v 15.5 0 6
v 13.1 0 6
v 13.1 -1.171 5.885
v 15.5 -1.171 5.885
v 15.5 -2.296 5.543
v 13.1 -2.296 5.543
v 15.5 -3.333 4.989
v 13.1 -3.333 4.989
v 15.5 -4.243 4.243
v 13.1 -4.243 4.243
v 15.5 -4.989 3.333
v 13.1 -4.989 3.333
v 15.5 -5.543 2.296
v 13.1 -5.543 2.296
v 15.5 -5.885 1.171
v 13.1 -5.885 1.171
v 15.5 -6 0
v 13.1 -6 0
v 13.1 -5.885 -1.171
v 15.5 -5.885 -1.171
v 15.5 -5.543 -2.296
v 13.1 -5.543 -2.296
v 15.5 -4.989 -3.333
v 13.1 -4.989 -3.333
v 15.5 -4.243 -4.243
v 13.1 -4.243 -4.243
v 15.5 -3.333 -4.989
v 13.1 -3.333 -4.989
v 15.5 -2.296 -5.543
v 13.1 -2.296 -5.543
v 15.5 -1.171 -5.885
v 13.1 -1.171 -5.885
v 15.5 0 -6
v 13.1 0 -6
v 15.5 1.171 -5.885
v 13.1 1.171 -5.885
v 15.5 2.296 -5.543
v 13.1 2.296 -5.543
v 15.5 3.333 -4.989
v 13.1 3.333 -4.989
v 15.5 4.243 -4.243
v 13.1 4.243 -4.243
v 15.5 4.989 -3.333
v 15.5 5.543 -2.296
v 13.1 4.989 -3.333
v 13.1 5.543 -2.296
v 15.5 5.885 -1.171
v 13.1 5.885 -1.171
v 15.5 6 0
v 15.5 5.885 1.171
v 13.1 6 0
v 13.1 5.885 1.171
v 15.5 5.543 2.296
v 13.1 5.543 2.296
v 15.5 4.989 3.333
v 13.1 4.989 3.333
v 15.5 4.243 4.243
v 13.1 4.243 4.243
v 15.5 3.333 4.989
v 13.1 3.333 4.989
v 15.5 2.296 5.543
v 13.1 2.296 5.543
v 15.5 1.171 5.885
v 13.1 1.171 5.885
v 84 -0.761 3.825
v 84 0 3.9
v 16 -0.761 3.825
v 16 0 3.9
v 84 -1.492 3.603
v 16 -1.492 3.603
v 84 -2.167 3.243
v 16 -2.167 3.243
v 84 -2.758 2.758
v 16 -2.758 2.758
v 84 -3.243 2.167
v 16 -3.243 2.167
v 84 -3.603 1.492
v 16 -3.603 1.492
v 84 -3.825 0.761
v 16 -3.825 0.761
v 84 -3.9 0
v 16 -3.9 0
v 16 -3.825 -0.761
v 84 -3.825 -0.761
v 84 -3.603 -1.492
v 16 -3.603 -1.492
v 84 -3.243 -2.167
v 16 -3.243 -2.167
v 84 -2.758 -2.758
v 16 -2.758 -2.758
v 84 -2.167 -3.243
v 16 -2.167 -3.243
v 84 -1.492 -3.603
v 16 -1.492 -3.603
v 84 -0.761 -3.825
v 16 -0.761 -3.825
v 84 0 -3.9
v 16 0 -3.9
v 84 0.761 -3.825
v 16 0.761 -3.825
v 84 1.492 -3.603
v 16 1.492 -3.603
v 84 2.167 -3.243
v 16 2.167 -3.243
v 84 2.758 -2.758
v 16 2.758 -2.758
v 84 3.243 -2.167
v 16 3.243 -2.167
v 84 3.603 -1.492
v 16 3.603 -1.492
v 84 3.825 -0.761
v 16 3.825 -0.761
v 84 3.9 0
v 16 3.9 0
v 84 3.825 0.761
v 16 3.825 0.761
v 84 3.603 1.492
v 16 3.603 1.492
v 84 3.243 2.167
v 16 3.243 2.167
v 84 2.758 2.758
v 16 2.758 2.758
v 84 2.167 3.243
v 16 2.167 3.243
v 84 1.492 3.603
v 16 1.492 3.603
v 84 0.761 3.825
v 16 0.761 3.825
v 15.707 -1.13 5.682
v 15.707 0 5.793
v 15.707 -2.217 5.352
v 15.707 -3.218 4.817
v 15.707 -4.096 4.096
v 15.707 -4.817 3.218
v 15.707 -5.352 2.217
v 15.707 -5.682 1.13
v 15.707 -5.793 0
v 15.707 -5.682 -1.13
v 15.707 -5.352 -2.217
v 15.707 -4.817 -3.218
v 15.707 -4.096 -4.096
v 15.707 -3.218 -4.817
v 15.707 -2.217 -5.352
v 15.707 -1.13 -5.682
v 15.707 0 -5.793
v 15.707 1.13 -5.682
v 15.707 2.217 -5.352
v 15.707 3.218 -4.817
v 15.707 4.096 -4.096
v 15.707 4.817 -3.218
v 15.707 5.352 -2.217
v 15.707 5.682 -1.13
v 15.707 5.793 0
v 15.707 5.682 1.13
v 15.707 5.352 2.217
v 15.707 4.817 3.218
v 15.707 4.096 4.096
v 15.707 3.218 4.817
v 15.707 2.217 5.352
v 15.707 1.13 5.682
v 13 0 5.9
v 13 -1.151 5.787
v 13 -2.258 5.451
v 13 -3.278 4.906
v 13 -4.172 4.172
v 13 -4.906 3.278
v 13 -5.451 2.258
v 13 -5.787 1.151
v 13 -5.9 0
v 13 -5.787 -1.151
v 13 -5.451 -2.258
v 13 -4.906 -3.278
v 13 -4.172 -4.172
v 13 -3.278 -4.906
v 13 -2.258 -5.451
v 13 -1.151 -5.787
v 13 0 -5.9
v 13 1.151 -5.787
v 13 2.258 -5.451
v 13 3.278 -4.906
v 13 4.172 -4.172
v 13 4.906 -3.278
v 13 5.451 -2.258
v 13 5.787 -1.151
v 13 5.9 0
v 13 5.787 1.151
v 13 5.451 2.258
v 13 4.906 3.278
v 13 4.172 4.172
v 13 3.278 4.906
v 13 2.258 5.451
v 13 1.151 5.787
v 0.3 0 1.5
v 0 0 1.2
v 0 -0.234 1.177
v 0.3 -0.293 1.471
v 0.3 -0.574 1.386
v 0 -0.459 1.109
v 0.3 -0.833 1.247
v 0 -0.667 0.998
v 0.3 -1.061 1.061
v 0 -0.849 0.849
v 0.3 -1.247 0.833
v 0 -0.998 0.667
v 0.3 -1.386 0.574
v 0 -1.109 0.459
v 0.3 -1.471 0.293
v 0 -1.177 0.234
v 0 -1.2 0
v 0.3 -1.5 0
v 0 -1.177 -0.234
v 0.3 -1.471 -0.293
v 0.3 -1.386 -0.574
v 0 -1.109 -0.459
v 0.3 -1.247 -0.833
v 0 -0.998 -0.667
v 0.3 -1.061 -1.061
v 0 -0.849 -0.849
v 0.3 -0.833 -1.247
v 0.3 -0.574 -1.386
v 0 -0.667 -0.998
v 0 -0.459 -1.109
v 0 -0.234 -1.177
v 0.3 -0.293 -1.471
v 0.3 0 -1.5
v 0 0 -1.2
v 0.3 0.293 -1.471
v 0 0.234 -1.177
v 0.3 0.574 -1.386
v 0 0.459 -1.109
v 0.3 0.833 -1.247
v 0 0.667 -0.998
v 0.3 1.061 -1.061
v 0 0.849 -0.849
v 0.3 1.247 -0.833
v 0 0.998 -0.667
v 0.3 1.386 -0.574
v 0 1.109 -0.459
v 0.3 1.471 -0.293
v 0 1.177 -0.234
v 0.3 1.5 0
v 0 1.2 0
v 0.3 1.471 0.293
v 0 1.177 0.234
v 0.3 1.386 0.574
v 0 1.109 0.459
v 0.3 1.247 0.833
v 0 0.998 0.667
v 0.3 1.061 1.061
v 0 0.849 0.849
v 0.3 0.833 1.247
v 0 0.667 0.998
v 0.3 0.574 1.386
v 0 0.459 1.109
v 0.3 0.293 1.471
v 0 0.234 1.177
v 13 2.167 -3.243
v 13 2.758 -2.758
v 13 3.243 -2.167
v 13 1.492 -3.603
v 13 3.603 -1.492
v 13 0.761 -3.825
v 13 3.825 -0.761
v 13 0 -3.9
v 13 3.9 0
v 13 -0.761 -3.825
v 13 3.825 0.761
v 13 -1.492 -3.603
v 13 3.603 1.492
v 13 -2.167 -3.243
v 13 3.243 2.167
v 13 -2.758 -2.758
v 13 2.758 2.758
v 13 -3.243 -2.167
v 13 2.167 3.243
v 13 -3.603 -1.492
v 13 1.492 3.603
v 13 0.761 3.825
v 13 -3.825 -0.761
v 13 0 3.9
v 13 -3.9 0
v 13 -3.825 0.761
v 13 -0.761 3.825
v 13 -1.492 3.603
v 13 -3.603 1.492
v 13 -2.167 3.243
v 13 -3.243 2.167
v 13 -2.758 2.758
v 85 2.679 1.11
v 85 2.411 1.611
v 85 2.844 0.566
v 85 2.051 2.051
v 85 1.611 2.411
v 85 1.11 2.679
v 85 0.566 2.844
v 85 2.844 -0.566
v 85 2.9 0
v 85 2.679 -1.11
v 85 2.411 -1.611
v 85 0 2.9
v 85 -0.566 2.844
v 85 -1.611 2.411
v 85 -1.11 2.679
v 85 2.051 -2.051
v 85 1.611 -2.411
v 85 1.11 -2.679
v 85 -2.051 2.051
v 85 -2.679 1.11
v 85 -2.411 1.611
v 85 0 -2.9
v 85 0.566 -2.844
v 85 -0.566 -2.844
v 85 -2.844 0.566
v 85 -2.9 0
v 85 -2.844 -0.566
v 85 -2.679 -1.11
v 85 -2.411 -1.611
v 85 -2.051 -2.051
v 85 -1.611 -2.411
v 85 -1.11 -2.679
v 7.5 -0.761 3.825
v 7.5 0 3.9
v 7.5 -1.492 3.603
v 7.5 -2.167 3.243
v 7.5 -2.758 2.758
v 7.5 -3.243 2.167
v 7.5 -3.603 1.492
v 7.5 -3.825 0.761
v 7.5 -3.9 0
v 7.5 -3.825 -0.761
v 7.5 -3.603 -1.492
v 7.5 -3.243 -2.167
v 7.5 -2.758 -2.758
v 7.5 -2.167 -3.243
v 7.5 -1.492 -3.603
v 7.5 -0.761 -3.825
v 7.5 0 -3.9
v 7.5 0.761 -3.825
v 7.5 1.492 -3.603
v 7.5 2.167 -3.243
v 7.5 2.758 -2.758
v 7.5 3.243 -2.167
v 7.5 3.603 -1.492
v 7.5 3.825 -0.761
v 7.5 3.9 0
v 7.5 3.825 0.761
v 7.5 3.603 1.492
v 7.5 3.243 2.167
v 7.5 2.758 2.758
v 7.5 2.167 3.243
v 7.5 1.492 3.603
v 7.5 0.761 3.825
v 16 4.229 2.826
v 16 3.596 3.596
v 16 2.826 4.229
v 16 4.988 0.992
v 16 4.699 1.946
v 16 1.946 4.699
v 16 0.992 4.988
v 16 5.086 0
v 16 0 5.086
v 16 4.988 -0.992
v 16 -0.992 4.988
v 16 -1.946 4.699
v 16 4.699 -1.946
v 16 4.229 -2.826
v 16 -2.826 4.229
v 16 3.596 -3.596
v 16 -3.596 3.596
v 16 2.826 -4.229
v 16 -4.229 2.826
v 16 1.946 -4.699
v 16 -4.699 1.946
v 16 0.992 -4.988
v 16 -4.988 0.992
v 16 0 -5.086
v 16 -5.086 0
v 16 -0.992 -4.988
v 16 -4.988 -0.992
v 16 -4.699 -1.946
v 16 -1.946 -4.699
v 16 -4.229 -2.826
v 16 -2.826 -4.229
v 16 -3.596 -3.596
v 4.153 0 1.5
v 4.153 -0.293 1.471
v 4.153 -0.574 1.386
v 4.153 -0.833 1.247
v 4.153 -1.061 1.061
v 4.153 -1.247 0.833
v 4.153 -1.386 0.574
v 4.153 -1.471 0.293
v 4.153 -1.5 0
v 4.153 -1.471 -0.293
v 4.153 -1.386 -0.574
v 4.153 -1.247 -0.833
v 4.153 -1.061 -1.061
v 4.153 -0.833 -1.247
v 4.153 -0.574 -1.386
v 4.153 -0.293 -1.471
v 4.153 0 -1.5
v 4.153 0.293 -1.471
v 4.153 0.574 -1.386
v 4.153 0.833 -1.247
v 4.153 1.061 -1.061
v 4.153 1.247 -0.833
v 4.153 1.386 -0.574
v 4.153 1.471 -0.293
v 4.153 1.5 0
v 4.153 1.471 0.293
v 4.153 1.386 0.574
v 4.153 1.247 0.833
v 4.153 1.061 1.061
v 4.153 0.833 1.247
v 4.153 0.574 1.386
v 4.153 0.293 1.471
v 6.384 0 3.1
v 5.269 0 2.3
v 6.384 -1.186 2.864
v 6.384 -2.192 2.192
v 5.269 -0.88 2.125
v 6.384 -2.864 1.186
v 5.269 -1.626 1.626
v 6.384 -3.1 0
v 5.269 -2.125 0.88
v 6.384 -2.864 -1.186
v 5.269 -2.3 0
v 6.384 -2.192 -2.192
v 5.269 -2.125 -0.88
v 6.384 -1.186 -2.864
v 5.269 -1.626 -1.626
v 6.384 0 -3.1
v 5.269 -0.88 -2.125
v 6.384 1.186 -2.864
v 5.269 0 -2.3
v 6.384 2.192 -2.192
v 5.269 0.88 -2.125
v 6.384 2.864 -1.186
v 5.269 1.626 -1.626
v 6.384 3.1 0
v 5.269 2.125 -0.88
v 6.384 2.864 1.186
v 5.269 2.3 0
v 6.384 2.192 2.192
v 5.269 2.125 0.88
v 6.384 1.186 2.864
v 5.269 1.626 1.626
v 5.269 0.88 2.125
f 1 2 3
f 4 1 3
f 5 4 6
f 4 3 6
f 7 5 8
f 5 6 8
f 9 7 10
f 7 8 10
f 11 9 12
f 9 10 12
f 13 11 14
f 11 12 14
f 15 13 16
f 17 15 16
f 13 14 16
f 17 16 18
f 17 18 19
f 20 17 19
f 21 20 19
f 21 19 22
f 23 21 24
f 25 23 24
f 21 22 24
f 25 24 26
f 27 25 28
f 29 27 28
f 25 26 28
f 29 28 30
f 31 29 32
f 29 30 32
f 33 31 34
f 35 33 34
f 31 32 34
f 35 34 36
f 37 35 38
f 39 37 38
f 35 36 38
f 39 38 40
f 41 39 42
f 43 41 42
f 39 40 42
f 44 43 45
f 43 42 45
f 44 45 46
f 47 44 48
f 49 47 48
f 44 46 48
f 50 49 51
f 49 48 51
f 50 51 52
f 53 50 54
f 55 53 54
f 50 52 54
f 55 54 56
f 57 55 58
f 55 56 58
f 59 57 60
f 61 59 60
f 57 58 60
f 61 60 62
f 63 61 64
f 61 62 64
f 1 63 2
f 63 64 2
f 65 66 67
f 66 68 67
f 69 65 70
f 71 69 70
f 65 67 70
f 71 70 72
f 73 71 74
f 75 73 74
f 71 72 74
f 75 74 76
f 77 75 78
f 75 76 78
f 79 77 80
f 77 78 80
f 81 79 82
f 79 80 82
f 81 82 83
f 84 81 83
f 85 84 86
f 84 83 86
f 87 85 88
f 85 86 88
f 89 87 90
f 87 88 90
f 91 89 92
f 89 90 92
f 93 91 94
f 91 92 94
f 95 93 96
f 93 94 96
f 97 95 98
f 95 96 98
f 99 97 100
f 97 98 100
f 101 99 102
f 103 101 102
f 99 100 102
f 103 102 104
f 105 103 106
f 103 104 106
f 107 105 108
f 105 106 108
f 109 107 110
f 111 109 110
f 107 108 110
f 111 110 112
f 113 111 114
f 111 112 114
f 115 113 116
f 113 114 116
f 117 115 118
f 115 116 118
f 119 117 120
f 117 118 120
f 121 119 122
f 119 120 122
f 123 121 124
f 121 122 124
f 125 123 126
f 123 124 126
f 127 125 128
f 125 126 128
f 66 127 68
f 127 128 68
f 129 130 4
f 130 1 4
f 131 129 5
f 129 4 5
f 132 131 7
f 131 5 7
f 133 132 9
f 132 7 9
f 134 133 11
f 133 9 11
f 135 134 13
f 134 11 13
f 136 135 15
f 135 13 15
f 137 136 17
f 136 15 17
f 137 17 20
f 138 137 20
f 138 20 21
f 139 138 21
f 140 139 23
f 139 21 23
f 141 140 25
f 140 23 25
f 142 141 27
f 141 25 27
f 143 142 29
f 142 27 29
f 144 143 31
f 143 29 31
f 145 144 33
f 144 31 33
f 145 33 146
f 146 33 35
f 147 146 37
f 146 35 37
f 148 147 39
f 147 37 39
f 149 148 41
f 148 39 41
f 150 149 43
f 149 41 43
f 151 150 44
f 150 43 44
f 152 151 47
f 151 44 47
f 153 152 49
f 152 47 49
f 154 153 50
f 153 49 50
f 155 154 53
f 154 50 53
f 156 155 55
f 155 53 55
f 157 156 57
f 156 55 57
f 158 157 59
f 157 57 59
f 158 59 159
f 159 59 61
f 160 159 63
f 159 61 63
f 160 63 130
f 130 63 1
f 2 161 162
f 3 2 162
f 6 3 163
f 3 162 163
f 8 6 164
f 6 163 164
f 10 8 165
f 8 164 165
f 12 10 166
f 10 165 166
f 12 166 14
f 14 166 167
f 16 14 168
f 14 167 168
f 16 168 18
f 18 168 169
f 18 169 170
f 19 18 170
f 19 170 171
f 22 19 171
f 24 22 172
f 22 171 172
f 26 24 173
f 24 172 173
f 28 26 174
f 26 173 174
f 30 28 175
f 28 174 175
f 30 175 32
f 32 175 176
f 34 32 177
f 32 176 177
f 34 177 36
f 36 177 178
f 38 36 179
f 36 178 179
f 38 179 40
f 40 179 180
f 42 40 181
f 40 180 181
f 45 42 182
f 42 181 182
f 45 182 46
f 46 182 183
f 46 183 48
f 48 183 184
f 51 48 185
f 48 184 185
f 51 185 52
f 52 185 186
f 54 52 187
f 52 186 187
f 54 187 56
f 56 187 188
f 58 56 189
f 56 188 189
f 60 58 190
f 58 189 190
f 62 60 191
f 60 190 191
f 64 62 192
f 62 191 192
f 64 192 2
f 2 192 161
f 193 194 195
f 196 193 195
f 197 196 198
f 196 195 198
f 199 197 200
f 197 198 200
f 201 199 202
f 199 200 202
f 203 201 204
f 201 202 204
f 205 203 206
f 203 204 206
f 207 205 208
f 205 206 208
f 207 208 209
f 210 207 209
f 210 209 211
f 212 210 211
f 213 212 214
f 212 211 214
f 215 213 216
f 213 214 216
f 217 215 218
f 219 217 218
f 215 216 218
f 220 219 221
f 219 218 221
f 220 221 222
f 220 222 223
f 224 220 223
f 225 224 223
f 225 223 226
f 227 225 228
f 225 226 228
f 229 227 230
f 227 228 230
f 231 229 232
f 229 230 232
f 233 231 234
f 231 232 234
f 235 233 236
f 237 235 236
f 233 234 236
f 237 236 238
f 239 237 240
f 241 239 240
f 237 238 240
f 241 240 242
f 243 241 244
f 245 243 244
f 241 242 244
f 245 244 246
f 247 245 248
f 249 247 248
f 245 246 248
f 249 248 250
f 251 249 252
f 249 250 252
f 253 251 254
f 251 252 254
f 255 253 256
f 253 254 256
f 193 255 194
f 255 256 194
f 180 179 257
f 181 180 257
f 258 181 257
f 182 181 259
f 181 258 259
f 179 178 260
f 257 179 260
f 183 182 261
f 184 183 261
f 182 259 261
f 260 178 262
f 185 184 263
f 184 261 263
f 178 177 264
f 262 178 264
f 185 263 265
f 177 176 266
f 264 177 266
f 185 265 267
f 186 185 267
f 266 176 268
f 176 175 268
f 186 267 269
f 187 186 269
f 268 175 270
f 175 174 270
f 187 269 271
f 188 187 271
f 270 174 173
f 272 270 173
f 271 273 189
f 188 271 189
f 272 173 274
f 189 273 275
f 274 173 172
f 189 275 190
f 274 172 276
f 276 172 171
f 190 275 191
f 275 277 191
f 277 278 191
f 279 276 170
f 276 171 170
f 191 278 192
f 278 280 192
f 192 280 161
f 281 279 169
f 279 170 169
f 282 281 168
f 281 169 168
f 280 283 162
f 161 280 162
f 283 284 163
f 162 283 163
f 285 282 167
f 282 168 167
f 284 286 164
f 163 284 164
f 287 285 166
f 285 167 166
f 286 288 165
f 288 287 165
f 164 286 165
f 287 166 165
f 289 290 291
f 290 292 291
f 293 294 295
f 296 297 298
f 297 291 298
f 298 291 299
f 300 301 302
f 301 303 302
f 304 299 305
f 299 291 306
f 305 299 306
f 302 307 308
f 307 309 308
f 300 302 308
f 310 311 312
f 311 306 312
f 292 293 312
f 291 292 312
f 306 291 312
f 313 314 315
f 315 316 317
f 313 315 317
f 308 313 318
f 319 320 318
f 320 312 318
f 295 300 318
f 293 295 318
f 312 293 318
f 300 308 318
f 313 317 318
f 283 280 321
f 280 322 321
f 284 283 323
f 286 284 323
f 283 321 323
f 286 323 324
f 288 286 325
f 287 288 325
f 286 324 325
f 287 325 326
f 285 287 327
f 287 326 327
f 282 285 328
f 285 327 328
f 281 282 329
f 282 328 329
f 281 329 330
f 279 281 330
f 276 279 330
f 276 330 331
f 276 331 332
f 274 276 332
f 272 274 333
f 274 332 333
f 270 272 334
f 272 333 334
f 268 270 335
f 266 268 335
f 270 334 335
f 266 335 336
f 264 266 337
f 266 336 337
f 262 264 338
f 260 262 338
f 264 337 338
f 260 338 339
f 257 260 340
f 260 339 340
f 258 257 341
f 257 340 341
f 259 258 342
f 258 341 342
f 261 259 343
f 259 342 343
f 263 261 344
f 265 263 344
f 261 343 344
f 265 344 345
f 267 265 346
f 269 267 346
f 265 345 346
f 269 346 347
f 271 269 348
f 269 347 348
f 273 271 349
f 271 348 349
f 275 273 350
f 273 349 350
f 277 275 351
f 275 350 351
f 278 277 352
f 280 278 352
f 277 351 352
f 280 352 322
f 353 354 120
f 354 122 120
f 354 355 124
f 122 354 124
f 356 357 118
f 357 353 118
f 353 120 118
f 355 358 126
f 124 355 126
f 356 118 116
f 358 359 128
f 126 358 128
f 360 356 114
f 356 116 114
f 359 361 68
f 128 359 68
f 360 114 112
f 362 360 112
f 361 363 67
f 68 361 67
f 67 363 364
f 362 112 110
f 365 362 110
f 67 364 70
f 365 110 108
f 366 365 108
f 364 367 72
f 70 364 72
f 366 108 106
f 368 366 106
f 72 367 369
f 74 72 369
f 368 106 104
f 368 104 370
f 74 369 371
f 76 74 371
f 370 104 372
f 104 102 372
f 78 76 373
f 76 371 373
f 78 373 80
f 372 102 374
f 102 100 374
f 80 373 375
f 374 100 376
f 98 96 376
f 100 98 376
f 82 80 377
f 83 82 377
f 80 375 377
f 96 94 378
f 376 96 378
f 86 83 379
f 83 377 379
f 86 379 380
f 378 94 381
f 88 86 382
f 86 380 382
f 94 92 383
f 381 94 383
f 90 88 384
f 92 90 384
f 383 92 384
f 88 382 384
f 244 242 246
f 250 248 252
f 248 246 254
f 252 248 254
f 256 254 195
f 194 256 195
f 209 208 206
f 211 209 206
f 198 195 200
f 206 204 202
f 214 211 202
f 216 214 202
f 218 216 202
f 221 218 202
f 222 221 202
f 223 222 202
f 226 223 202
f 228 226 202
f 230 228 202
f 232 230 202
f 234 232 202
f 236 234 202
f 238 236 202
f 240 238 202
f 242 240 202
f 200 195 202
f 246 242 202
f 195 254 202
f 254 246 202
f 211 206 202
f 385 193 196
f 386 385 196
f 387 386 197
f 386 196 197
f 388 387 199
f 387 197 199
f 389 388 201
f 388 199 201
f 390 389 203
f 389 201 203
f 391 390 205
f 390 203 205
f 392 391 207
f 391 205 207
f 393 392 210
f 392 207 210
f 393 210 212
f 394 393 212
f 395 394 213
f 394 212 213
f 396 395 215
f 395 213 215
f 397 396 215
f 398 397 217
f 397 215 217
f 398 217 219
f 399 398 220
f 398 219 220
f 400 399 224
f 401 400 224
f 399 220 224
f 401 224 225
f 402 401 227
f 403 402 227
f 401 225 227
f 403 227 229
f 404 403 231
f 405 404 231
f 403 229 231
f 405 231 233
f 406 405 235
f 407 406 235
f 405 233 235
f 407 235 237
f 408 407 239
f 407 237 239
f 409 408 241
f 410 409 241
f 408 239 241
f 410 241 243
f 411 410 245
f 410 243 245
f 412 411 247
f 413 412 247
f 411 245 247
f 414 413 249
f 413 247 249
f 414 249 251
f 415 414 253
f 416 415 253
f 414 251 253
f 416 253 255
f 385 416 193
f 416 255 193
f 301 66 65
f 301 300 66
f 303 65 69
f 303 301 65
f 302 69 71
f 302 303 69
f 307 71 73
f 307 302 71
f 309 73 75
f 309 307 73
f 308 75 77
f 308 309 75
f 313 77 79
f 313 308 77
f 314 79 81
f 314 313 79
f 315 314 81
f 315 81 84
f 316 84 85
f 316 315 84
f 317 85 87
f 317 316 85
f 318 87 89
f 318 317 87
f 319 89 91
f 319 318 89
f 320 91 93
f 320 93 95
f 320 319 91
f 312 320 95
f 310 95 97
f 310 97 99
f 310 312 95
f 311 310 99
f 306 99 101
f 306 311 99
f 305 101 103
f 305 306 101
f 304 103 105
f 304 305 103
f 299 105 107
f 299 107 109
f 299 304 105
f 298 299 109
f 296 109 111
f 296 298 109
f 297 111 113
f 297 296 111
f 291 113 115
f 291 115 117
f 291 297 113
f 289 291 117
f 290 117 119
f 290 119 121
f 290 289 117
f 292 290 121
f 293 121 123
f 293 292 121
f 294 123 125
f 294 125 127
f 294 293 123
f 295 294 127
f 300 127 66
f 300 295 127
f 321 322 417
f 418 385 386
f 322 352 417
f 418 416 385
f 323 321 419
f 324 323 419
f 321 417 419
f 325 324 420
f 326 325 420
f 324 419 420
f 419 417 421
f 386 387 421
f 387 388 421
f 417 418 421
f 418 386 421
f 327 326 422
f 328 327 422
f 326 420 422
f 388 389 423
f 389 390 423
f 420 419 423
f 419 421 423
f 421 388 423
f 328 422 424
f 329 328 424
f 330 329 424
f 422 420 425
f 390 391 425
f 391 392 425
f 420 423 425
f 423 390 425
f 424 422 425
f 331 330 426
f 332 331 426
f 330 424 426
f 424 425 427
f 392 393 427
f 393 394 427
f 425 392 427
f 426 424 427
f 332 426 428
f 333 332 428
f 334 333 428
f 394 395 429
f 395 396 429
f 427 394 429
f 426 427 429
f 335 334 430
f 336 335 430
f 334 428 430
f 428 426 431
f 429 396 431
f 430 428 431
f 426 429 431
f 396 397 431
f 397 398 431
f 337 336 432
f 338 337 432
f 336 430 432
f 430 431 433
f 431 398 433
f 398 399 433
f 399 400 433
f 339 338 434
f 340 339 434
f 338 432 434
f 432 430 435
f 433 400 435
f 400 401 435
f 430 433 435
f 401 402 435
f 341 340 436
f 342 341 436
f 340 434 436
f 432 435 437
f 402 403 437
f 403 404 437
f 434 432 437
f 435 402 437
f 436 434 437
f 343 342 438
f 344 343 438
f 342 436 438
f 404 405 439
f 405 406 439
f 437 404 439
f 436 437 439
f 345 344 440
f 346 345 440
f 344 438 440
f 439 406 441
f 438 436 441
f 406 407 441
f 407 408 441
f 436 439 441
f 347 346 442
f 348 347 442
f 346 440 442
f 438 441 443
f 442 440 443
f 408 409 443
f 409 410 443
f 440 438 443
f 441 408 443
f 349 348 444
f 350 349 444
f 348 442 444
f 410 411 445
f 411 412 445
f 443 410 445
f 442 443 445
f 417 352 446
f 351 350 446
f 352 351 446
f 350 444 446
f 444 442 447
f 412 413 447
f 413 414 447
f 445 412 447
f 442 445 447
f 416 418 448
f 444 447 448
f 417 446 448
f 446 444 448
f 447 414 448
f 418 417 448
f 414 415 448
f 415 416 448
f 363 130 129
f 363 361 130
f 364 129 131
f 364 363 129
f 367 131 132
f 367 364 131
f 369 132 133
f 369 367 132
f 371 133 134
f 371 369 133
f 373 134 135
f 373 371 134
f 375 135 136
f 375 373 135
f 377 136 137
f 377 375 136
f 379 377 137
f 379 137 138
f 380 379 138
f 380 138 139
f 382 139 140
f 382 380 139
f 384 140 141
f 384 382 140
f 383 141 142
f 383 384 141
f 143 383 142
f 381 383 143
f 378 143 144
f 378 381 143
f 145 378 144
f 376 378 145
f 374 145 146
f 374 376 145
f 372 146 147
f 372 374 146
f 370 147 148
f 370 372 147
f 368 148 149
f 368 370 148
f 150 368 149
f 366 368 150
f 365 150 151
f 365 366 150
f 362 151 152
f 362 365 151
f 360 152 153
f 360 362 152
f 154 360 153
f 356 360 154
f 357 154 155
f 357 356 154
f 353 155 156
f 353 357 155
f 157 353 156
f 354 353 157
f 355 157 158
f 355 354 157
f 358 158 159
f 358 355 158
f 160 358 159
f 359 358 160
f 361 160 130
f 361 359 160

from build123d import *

# Parameters (mm, degrees)
F0_W    = 14
F0_H    = 3.9
F2_SIZE = 0.5
F3_SIZE = 0.1
F4_SIZE = 0.3


# Not quite as in the source:
# - a fillet or chamfer that OpenCascade refuses, or shapes differently, is made with other operations: its cross-section is extruded or revolved along the edge and cut away or added


with BuildPart() as f1:
    # F0 (on Front) → F1 (revolve)
    with BuildSketch(Plane.XZ):
        Polygon((0, 1.5), (0, 0), (71, 0), (71, 3.9), (16, 3.9), (16, 6), (13, 6), (13, 3.9), (7.5, 3.9), (4.1531170718, 1.5), align=None)
        with Locations((78, 1.95)):
            Rectangle(F0_W, F0_H)
    revolve(axis=Axis((35.5, 0, 0), (1, 0, 0)))

    # F2
    f2_edges = [f1.edges().sort_by_distance(p)[0] for p in [
        (16, 0, -6),
    ]]
    chamfer(f2_edges, length=F2_SIZE)

    # F3
    f3_edges = [f1.edges().sort_by_distance(p)[0] for p in [
        (13, 0, -6),
    ]]
    chamfer(f3_edges, length=F3_SIZE)

    # F4
    f4_edges = [f1.edges().sort_by_distance(p)[0] for p in [
        (0, 0, -1.5),
    ]]
    chamfer(f4_edges, length=F4_SIZE)

    # F5: chamfer of 1 on 2 edges, made by hand

    # F5_s1 → F5_t2 (revolve, cut)
    with BuildSketch(Plane.XZ):
        Polygon((15.7071067812, 5.7928932188), (16, 5.0857864376), (16, 5.5), align=None)
    revolve(axis=Axis((16, 0, 0), (1, 0, 0)), mode=Mode.SUBTRACT)

    # F5_s3 → F5_t4 (revolve, cut)
    with BuildSketch(Plane.XZ):
        Polygon((84, 3.9), (85, 2.9), (85, 3.9), align=None)
    revolve(axis=Axis((85, 0, 0), (1, 0, 0)), mode=Mode.SUBTRACT)


solid = f1.part
